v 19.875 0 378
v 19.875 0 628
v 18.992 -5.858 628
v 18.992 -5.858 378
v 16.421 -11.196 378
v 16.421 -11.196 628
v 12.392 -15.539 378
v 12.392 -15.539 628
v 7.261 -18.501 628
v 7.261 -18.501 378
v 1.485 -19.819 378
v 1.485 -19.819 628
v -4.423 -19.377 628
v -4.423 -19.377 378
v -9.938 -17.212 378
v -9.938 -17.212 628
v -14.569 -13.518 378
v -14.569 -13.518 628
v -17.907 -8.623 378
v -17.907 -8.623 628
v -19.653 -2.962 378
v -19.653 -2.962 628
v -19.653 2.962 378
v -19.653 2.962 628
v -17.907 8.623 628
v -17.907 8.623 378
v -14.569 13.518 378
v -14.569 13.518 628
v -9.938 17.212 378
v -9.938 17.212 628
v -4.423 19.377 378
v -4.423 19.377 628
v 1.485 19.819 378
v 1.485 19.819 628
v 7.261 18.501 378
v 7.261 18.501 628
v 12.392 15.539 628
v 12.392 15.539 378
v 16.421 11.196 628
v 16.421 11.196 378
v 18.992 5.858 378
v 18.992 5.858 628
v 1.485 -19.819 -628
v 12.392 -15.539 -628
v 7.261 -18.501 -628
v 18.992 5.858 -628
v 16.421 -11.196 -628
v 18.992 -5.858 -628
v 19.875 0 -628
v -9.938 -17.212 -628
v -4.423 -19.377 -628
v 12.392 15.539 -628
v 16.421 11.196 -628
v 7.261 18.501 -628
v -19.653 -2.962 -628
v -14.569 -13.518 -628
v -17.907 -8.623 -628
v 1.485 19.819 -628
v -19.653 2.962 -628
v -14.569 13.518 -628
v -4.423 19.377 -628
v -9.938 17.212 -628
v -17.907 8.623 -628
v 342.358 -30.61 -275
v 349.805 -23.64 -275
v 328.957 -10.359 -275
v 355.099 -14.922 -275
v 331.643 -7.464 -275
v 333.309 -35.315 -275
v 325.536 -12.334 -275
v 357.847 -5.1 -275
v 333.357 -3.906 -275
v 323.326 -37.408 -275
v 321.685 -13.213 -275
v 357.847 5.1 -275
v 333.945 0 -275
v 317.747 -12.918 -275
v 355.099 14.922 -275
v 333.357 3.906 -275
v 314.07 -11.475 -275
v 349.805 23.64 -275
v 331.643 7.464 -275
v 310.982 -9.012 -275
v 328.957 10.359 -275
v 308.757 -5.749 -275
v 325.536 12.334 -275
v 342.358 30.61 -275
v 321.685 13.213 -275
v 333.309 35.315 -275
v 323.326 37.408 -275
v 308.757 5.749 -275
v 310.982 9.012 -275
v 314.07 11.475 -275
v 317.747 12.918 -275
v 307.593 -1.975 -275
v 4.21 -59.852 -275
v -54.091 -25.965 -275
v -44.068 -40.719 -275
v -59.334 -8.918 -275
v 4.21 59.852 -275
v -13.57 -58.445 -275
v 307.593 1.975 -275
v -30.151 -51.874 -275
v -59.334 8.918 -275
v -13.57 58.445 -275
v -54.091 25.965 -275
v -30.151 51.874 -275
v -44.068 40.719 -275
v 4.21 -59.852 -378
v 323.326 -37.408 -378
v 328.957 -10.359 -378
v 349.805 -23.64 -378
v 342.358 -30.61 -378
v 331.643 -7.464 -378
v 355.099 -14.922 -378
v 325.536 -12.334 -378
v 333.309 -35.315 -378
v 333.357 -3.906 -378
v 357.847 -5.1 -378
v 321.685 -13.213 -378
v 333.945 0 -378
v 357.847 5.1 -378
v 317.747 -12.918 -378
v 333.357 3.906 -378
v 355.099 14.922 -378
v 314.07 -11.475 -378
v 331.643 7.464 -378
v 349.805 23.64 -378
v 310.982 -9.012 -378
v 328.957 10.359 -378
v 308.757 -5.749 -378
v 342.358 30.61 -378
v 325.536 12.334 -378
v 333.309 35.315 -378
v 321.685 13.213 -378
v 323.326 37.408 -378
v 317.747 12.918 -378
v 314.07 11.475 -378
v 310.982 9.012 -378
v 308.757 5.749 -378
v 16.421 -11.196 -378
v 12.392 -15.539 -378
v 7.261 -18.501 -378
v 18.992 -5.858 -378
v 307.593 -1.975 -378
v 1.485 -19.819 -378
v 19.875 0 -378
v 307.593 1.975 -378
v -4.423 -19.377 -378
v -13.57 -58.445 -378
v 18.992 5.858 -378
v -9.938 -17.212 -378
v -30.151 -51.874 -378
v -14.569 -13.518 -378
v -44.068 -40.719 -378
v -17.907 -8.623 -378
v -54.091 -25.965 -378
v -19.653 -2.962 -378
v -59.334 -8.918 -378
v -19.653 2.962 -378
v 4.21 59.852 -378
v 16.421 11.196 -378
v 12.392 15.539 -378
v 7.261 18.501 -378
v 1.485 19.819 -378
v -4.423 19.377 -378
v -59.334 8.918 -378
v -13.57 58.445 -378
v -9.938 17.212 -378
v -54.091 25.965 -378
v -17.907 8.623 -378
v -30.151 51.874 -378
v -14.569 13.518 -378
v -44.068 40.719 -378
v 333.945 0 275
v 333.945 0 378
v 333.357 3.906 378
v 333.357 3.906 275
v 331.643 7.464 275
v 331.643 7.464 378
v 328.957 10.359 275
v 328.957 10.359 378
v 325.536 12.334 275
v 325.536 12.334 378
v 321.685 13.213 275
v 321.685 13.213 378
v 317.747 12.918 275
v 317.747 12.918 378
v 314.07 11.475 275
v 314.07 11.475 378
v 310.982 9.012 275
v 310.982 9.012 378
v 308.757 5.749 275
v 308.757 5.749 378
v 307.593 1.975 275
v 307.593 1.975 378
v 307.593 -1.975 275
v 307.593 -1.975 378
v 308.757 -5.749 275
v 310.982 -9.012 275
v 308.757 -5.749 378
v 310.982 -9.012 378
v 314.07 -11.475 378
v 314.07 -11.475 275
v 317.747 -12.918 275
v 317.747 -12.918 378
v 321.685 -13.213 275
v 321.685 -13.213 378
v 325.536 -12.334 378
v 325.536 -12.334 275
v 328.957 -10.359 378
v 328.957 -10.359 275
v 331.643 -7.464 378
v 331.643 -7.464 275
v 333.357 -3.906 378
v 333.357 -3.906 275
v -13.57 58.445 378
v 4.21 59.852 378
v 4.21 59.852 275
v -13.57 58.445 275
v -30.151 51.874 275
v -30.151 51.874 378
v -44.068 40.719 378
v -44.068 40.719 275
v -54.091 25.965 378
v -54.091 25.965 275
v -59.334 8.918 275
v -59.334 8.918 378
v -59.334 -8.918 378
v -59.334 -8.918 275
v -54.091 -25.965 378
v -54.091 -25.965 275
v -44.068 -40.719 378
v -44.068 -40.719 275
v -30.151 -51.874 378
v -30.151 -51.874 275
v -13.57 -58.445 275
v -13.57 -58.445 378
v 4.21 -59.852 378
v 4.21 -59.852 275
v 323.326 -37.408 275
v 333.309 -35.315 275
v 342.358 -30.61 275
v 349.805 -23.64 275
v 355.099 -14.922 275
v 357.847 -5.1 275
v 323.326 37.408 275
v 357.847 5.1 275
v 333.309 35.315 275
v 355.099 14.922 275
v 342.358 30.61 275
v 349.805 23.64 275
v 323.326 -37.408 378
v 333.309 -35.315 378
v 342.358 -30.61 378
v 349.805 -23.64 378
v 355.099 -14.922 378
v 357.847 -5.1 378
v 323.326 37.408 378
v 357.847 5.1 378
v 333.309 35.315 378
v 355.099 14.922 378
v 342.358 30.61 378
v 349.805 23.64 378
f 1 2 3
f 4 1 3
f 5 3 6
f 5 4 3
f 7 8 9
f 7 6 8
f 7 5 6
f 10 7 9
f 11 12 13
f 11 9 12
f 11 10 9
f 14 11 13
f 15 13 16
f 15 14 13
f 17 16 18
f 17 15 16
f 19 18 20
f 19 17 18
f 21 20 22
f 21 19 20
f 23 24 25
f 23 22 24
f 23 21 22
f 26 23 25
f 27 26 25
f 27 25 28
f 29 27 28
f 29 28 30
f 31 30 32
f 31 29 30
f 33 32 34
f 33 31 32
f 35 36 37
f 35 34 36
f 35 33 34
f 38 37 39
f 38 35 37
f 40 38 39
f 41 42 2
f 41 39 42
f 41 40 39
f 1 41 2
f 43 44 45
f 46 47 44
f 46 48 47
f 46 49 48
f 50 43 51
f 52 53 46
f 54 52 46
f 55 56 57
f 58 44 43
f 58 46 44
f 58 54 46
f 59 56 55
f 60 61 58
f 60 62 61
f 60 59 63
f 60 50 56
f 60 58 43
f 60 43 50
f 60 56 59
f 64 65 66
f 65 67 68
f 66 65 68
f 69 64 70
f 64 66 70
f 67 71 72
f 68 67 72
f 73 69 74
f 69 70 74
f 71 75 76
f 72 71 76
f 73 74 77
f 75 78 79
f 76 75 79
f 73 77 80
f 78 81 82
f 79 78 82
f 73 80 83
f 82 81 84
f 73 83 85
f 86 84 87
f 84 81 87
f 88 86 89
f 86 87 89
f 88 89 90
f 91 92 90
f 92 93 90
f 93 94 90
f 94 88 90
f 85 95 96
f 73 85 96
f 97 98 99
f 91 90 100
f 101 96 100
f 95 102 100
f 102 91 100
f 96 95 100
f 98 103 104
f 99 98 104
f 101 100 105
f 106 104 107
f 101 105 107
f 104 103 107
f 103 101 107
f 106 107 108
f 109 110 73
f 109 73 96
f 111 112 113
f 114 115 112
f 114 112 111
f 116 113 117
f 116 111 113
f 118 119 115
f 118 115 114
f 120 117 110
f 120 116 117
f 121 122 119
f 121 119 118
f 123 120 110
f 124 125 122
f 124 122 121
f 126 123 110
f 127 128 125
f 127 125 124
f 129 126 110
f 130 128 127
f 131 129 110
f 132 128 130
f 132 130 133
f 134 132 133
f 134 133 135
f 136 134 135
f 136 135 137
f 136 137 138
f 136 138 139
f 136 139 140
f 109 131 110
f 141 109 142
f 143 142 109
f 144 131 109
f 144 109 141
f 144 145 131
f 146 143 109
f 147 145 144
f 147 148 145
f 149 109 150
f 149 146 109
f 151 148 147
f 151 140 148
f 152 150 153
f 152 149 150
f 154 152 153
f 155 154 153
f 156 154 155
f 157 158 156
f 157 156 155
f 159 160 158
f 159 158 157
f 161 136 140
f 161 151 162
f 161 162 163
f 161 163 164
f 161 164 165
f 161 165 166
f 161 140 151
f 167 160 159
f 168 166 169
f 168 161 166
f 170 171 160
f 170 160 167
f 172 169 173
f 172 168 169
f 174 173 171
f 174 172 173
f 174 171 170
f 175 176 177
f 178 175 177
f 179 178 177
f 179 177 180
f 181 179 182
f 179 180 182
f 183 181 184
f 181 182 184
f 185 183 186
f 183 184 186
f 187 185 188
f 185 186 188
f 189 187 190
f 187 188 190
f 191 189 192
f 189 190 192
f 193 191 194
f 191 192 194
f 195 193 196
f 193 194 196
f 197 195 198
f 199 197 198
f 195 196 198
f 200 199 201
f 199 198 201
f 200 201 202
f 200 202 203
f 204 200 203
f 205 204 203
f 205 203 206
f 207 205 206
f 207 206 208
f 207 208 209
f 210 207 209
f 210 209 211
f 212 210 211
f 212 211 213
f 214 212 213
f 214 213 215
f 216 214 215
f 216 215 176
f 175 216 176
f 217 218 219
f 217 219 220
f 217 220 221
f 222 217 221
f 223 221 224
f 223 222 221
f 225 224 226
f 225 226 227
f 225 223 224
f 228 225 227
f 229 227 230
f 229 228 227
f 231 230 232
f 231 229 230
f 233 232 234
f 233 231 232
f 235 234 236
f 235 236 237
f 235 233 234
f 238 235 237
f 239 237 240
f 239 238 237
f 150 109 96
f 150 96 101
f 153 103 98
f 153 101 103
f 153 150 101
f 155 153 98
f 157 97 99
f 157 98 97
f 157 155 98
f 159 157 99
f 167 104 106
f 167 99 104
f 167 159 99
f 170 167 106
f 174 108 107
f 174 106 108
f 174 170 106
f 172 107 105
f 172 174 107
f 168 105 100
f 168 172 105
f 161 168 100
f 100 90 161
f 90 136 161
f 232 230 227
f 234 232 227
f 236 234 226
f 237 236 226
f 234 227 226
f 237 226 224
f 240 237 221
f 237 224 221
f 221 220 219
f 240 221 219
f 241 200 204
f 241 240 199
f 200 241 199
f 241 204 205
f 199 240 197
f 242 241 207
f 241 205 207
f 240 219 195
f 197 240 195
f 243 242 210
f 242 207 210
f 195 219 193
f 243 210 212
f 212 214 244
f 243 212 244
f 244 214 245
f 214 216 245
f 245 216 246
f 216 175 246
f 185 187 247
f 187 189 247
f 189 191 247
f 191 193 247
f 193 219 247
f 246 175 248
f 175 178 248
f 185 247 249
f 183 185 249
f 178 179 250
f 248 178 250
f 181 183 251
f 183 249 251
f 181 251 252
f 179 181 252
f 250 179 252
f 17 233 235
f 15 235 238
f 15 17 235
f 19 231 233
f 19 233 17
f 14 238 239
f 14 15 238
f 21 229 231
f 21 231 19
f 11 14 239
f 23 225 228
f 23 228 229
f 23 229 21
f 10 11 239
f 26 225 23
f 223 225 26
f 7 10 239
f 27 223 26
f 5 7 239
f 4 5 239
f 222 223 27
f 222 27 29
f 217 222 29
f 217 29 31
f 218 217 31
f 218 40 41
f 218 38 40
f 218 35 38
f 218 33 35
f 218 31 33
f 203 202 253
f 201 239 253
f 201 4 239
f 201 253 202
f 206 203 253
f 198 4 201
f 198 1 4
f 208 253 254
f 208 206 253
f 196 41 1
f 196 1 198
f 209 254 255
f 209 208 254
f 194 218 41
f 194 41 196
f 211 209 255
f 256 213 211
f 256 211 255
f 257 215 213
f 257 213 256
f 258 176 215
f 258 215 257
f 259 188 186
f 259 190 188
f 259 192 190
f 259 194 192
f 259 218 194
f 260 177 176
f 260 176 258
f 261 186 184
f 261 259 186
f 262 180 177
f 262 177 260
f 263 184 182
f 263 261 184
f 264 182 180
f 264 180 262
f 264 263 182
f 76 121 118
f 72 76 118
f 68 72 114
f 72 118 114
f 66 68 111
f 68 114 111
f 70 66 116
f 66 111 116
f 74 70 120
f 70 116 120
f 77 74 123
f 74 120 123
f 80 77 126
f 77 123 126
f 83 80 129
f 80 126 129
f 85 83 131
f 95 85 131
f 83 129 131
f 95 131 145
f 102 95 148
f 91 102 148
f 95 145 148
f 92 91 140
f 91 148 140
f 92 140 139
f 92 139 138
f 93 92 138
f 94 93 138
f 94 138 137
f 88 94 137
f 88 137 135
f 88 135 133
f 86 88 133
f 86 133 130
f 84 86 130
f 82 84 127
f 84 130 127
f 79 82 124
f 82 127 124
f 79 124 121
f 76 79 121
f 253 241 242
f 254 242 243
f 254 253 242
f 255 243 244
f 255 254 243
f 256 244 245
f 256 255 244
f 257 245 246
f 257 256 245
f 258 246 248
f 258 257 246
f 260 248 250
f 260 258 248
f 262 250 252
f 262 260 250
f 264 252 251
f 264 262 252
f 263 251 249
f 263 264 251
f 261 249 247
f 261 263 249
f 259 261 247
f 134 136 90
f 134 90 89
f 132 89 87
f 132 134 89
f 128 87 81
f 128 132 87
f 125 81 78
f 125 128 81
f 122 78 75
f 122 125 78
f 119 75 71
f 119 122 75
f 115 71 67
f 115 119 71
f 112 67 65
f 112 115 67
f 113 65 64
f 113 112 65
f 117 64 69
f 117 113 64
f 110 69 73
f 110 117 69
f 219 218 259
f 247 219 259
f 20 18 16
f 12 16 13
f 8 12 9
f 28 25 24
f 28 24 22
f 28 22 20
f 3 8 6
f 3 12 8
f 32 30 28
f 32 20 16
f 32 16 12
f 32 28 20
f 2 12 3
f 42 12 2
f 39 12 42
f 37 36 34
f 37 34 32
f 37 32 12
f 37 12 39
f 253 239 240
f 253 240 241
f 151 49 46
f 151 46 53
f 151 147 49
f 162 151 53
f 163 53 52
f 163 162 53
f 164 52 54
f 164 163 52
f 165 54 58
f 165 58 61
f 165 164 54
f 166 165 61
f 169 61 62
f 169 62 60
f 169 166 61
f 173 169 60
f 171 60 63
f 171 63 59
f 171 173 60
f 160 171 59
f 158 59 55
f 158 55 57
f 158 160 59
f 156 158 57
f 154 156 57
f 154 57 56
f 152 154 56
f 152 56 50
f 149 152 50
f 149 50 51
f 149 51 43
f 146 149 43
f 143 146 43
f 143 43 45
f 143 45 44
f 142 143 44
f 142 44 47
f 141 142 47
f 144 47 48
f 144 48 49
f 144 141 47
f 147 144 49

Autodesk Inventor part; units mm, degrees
ref_plane "YZ Plane" through (0, 0, 0) normal (1, 0, 0) x (0, 1, 0)
ref_plane "XZ Plane" through (0, 0, 0) normal (0, 1, 0) x (-1, 0, 0)
ref_plane "工作平面1" through (0, 0, 378) normal (0, 0, 1) x (1, 0, 0)
sketch "草圖1" plane through (0, 0, 378) normal (0, 0, 1) x (1, 0, 0)
  line L0 (0, 0) -> (320.6953, 0) construction
  circle A0 centre (0, 0) radius 60
  circle A1 centre (320.6953, 0) radius 37.5
  line L1 (4.2096, 59.8521) -> (323.3263, 37.4076)
  line L2 (4.2096, -59.8521) -> (323.3263, -37.4076)
  point P0 (-31.7926, 50.8845)
  dimension "d3" = 320.6953
  dimension "d4" = 120
  dimension "d6" = 75
extrude "擠出1" add sketch "草圖1" against normal blind 103
sketch "草圖2" plane through (0, 0, 378) normal (0, 0, 1) x (1, 0, 0)
  arc A0 (4.2096, 59.8521) -> (4.2096, -59.8521) centre (0, 0) ccw projected
  arc A1 (323.3263, -37.4076) -> (323.3263, 37.4076) centre (320.6953, 0) ccw projected
  circle A2 centre (320.6953, 0) radius 13.25
  point P0 (70.7107, 70.7107)
  dimension "d13" = 26.5
extrude "擠出2" cut sketch "草圖2" against normal through all
sketch "草圖8" plane through (0, 0, 378) normal (0, 0, 1) x (1, 0, 0)
  circle A0 centre (0, 0) radius 19.875
  dimension "d51" = 39.75
extrude "擠出3" add sketch "草圖8" along normal blind 250
sketch "草圖3" plane through (323.3263, 37.4076, 378) normal (0.0701601, 0.9975357, 0) x (0.9975357, -0.0701601, 0)
  line L0 (0, 0) -> (0, 103) projected
  point P0 (-319.905, 378)
  point P1 (0, 51.5)
hole "孔1" [suppressed]
sketch "草圖5" plane through (11.1138, -59.3666, 275) normal (-0.0701601, 0.9975357, 0) x (0, 0, 1)
  line L0 (103, 312.9838) -> (0, 312.9838) projected
  point P0 (-275, -6.9212)
  point P1 (51.5, 312.9838)
hole "孔3" [suppressed]
mirror "鏡射1" about plane through (0, 0, 0) normal (0, 0, 1) of "擠出1", "擠出2", "擠出3"
equation "\"d3\" = R4"
equation "\"R4\" = T1A_R4"
equation "\"th4a\" = T1A_th4a"
equation "\"Width\" = T1A_R4_Width"
equation "\"d0\" = 0.5 * Width"
equation "\"T1A_R4\" = 320.6953"
equation "\"T1A_th4a\" = 45deg"
equation "\"T1A_R4_Width\" = 756"
equation "\"T1A_R1\" = 585.5331"
equation "\"T1A_R3\" = 252.3048"
equation "\"T1A_R5\" = 419.3047"
equation "\"T1A_R7\" = -221.7475"
equation "\"T1A_R8\" = 369.2781"
equation "\"T1A_R1_Width\" = 756"
equation "\"T1A_R2_Width\" = 756"
equation "\"T1A_R3_Width\" = 344"
equation "\"T1A_Joint_Width\" = 756"
properties part number "Type 1A R4主滑台曲柄:1" material "密度7850的鋼"
